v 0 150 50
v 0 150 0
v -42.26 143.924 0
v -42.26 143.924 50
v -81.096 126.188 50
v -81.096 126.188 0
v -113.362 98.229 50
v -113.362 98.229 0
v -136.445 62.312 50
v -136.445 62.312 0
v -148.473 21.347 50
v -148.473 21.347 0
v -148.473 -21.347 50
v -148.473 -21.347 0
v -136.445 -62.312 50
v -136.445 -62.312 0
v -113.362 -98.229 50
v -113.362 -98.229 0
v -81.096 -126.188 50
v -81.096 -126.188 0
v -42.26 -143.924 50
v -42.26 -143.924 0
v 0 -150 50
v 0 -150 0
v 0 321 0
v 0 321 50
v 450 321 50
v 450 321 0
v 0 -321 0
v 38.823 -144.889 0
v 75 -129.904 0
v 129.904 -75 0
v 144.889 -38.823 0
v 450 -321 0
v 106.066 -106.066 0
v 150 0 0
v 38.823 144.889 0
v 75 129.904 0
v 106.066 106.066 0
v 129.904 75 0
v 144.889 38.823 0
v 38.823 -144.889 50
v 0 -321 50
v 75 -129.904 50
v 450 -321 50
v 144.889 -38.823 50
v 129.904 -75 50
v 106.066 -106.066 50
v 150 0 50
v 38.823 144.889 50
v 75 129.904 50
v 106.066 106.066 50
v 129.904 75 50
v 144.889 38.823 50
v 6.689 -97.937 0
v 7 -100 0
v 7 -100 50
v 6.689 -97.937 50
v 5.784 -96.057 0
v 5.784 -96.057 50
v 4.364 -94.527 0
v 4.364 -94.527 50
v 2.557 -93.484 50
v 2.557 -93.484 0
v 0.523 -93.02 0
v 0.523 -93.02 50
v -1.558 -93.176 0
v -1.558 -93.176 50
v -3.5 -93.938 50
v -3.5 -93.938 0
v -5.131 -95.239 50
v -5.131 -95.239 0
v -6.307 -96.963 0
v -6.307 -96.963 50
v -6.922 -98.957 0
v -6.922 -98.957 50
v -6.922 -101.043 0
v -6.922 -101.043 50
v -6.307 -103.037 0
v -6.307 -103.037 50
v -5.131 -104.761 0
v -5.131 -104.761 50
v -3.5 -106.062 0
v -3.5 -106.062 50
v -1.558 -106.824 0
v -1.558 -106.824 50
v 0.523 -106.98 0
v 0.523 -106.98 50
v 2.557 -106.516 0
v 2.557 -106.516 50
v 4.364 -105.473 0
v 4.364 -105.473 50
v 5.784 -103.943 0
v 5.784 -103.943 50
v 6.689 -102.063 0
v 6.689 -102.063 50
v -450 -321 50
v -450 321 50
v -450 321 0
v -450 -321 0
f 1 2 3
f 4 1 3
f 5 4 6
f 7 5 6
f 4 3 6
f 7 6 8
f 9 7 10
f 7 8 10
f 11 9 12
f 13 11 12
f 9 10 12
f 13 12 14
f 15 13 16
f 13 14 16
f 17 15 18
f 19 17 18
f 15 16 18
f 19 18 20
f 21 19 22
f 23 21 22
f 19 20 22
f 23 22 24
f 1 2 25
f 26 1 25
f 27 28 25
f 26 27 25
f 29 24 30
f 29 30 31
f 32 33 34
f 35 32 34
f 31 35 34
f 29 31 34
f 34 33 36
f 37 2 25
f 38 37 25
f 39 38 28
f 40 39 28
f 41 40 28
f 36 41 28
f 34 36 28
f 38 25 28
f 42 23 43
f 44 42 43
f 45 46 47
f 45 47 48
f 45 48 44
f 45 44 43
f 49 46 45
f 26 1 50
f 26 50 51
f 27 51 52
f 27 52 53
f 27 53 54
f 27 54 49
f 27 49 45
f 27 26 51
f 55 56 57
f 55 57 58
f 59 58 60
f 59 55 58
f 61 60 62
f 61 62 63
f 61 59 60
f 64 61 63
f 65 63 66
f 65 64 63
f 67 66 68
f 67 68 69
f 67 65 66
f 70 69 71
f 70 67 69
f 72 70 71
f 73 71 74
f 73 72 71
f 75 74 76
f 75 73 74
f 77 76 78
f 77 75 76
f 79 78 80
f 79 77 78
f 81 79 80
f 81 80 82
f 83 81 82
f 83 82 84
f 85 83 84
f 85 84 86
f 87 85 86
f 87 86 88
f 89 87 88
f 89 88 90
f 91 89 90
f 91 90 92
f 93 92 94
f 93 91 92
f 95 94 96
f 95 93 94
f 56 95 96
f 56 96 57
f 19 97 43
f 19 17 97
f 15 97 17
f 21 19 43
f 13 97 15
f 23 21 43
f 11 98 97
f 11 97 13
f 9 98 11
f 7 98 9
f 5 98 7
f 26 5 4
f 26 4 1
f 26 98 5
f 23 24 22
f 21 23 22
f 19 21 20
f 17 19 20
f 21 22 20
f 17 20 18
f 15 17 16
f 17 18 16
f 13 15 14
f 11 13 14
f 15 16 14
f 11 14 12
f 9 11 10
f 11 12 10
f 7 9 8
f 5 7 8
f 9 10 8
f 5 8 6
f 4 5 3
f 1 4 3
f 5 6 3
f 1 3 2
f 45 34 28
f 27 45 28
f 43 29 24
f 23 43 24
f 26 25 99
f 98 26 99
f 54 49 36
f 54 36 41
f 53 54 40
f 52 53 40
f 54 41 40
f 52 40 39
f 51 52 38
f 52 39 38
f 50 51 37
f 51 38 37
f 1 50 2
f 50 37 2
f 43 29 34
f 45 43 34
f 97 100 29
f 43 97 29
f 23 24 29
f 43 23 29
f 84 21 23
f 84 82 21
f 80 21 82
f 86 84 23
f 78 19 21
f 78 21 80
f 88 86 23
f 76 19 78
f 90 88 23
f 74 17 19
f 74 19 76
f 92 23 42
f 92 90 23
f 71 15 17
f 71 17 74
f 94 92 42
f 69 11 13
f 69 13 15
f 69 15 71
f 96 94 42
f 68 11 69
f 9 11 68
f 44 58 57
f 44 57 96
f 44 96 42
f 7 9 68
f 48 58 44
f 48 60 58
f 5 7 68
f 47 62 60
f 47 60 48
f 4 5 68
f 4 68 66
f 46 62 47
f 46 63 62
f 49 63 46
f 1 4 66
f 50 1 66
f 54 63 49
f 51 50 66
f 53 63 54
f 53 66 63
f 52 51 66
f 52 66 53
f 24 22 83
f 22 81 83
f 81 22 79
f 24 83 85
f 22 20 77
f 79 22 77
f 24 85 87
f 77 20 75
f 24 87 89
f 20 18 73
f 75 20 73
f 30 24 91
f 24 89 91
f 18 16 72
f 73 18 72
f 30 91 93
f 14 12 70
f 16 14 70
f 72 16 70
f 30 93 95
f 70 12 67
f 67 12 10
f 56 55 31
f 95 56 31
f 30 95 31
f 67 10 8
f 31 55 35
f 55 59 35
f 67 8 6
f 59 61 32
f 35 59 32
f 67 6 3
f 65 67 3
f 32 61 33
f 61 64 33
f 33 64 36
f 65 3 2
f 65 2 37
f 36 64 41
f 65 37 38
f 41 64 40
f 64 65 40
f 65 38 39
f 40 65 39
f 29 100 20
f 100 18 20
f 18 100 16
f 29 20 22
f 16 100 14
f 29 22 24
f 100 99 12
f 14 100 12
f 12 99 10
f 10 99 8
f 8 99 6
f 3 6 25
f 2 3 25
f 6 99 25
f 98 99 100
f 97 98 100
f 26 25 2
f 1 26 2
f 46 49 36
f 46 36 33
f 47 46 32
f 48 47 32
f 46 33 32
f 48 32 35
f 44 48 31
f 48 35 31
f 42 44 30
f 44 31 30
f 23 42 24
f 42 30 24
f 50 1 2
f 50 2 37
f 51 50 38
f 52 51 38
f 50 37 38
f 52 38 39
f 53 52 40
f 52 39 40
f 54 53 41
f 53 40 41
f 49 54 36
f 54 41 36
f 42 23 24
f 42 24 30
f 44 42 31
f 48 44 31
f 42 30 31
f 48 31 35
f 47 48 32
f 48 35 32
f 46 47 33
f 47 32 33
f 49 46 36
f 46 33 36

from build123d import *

# Parameters (mm, degrees)
F1_DEPTH = 50
F2_DEPTH = 50
F0_R     = 7
F3_DEPTH = 50


with BuildPart() as f1:
    # F0 (on Top) → F1 (new body)
    with BuildSketch(Plane.XY):
        with BuildLine():
            Line((0, 150), (0, 321))
            Line((0, 321), (-450, 321))
            Line((-450, 321), (-450, -321))
            Line((-450, -321), (0, -321))
            Line((0, -321), (0, -150))
            ThreePointArc((0, -150), (-150, 0), (0, 150))
        make_face()
    extrude(amount=F1_DEPTH)


with BuildPart() as f2:
    # F0 (on Top) → F2 (new body)
    with BuildSketch(Plane.XY):
        with BuildLine():
            Line((450, -321), (450, 321))
            Line((450, 321), (0, 321))
            Line((0, 321), (0, 150))
            ThreePointArc((0, 150), (106.066017, 106.066017), (150, 0))
            ThreePointArc((150, 0), (106.066017, -106.066017), (0, -150))
            Line((0, -150), (0, -321))
            Line((0, -321), (450, -321))
        make_face()
    extrude(amount=F2_DEPTH)


with BuildPart() as f3:
    # F0 (on Top) → F3 (new body)
    with BuildSketch(Plane.XY):
        with BuildLine():
            ThreePointArc((150, 0), (106.066017, 106.066017), (0, 150))
            ThreePointArc((0, 150), (-150, 0), (0, -150))
            ThreePointArc((0, -150), (106.066017, -106.066017), (150, 0))
        make_face()
        with Locations((0, -100)):
            Circle(F0_R, mode=Mode.SUBTRACT)
    extrude(amount=F3_DEPTH)


solid = Compound([f1.part, f2.part, f3.part])
